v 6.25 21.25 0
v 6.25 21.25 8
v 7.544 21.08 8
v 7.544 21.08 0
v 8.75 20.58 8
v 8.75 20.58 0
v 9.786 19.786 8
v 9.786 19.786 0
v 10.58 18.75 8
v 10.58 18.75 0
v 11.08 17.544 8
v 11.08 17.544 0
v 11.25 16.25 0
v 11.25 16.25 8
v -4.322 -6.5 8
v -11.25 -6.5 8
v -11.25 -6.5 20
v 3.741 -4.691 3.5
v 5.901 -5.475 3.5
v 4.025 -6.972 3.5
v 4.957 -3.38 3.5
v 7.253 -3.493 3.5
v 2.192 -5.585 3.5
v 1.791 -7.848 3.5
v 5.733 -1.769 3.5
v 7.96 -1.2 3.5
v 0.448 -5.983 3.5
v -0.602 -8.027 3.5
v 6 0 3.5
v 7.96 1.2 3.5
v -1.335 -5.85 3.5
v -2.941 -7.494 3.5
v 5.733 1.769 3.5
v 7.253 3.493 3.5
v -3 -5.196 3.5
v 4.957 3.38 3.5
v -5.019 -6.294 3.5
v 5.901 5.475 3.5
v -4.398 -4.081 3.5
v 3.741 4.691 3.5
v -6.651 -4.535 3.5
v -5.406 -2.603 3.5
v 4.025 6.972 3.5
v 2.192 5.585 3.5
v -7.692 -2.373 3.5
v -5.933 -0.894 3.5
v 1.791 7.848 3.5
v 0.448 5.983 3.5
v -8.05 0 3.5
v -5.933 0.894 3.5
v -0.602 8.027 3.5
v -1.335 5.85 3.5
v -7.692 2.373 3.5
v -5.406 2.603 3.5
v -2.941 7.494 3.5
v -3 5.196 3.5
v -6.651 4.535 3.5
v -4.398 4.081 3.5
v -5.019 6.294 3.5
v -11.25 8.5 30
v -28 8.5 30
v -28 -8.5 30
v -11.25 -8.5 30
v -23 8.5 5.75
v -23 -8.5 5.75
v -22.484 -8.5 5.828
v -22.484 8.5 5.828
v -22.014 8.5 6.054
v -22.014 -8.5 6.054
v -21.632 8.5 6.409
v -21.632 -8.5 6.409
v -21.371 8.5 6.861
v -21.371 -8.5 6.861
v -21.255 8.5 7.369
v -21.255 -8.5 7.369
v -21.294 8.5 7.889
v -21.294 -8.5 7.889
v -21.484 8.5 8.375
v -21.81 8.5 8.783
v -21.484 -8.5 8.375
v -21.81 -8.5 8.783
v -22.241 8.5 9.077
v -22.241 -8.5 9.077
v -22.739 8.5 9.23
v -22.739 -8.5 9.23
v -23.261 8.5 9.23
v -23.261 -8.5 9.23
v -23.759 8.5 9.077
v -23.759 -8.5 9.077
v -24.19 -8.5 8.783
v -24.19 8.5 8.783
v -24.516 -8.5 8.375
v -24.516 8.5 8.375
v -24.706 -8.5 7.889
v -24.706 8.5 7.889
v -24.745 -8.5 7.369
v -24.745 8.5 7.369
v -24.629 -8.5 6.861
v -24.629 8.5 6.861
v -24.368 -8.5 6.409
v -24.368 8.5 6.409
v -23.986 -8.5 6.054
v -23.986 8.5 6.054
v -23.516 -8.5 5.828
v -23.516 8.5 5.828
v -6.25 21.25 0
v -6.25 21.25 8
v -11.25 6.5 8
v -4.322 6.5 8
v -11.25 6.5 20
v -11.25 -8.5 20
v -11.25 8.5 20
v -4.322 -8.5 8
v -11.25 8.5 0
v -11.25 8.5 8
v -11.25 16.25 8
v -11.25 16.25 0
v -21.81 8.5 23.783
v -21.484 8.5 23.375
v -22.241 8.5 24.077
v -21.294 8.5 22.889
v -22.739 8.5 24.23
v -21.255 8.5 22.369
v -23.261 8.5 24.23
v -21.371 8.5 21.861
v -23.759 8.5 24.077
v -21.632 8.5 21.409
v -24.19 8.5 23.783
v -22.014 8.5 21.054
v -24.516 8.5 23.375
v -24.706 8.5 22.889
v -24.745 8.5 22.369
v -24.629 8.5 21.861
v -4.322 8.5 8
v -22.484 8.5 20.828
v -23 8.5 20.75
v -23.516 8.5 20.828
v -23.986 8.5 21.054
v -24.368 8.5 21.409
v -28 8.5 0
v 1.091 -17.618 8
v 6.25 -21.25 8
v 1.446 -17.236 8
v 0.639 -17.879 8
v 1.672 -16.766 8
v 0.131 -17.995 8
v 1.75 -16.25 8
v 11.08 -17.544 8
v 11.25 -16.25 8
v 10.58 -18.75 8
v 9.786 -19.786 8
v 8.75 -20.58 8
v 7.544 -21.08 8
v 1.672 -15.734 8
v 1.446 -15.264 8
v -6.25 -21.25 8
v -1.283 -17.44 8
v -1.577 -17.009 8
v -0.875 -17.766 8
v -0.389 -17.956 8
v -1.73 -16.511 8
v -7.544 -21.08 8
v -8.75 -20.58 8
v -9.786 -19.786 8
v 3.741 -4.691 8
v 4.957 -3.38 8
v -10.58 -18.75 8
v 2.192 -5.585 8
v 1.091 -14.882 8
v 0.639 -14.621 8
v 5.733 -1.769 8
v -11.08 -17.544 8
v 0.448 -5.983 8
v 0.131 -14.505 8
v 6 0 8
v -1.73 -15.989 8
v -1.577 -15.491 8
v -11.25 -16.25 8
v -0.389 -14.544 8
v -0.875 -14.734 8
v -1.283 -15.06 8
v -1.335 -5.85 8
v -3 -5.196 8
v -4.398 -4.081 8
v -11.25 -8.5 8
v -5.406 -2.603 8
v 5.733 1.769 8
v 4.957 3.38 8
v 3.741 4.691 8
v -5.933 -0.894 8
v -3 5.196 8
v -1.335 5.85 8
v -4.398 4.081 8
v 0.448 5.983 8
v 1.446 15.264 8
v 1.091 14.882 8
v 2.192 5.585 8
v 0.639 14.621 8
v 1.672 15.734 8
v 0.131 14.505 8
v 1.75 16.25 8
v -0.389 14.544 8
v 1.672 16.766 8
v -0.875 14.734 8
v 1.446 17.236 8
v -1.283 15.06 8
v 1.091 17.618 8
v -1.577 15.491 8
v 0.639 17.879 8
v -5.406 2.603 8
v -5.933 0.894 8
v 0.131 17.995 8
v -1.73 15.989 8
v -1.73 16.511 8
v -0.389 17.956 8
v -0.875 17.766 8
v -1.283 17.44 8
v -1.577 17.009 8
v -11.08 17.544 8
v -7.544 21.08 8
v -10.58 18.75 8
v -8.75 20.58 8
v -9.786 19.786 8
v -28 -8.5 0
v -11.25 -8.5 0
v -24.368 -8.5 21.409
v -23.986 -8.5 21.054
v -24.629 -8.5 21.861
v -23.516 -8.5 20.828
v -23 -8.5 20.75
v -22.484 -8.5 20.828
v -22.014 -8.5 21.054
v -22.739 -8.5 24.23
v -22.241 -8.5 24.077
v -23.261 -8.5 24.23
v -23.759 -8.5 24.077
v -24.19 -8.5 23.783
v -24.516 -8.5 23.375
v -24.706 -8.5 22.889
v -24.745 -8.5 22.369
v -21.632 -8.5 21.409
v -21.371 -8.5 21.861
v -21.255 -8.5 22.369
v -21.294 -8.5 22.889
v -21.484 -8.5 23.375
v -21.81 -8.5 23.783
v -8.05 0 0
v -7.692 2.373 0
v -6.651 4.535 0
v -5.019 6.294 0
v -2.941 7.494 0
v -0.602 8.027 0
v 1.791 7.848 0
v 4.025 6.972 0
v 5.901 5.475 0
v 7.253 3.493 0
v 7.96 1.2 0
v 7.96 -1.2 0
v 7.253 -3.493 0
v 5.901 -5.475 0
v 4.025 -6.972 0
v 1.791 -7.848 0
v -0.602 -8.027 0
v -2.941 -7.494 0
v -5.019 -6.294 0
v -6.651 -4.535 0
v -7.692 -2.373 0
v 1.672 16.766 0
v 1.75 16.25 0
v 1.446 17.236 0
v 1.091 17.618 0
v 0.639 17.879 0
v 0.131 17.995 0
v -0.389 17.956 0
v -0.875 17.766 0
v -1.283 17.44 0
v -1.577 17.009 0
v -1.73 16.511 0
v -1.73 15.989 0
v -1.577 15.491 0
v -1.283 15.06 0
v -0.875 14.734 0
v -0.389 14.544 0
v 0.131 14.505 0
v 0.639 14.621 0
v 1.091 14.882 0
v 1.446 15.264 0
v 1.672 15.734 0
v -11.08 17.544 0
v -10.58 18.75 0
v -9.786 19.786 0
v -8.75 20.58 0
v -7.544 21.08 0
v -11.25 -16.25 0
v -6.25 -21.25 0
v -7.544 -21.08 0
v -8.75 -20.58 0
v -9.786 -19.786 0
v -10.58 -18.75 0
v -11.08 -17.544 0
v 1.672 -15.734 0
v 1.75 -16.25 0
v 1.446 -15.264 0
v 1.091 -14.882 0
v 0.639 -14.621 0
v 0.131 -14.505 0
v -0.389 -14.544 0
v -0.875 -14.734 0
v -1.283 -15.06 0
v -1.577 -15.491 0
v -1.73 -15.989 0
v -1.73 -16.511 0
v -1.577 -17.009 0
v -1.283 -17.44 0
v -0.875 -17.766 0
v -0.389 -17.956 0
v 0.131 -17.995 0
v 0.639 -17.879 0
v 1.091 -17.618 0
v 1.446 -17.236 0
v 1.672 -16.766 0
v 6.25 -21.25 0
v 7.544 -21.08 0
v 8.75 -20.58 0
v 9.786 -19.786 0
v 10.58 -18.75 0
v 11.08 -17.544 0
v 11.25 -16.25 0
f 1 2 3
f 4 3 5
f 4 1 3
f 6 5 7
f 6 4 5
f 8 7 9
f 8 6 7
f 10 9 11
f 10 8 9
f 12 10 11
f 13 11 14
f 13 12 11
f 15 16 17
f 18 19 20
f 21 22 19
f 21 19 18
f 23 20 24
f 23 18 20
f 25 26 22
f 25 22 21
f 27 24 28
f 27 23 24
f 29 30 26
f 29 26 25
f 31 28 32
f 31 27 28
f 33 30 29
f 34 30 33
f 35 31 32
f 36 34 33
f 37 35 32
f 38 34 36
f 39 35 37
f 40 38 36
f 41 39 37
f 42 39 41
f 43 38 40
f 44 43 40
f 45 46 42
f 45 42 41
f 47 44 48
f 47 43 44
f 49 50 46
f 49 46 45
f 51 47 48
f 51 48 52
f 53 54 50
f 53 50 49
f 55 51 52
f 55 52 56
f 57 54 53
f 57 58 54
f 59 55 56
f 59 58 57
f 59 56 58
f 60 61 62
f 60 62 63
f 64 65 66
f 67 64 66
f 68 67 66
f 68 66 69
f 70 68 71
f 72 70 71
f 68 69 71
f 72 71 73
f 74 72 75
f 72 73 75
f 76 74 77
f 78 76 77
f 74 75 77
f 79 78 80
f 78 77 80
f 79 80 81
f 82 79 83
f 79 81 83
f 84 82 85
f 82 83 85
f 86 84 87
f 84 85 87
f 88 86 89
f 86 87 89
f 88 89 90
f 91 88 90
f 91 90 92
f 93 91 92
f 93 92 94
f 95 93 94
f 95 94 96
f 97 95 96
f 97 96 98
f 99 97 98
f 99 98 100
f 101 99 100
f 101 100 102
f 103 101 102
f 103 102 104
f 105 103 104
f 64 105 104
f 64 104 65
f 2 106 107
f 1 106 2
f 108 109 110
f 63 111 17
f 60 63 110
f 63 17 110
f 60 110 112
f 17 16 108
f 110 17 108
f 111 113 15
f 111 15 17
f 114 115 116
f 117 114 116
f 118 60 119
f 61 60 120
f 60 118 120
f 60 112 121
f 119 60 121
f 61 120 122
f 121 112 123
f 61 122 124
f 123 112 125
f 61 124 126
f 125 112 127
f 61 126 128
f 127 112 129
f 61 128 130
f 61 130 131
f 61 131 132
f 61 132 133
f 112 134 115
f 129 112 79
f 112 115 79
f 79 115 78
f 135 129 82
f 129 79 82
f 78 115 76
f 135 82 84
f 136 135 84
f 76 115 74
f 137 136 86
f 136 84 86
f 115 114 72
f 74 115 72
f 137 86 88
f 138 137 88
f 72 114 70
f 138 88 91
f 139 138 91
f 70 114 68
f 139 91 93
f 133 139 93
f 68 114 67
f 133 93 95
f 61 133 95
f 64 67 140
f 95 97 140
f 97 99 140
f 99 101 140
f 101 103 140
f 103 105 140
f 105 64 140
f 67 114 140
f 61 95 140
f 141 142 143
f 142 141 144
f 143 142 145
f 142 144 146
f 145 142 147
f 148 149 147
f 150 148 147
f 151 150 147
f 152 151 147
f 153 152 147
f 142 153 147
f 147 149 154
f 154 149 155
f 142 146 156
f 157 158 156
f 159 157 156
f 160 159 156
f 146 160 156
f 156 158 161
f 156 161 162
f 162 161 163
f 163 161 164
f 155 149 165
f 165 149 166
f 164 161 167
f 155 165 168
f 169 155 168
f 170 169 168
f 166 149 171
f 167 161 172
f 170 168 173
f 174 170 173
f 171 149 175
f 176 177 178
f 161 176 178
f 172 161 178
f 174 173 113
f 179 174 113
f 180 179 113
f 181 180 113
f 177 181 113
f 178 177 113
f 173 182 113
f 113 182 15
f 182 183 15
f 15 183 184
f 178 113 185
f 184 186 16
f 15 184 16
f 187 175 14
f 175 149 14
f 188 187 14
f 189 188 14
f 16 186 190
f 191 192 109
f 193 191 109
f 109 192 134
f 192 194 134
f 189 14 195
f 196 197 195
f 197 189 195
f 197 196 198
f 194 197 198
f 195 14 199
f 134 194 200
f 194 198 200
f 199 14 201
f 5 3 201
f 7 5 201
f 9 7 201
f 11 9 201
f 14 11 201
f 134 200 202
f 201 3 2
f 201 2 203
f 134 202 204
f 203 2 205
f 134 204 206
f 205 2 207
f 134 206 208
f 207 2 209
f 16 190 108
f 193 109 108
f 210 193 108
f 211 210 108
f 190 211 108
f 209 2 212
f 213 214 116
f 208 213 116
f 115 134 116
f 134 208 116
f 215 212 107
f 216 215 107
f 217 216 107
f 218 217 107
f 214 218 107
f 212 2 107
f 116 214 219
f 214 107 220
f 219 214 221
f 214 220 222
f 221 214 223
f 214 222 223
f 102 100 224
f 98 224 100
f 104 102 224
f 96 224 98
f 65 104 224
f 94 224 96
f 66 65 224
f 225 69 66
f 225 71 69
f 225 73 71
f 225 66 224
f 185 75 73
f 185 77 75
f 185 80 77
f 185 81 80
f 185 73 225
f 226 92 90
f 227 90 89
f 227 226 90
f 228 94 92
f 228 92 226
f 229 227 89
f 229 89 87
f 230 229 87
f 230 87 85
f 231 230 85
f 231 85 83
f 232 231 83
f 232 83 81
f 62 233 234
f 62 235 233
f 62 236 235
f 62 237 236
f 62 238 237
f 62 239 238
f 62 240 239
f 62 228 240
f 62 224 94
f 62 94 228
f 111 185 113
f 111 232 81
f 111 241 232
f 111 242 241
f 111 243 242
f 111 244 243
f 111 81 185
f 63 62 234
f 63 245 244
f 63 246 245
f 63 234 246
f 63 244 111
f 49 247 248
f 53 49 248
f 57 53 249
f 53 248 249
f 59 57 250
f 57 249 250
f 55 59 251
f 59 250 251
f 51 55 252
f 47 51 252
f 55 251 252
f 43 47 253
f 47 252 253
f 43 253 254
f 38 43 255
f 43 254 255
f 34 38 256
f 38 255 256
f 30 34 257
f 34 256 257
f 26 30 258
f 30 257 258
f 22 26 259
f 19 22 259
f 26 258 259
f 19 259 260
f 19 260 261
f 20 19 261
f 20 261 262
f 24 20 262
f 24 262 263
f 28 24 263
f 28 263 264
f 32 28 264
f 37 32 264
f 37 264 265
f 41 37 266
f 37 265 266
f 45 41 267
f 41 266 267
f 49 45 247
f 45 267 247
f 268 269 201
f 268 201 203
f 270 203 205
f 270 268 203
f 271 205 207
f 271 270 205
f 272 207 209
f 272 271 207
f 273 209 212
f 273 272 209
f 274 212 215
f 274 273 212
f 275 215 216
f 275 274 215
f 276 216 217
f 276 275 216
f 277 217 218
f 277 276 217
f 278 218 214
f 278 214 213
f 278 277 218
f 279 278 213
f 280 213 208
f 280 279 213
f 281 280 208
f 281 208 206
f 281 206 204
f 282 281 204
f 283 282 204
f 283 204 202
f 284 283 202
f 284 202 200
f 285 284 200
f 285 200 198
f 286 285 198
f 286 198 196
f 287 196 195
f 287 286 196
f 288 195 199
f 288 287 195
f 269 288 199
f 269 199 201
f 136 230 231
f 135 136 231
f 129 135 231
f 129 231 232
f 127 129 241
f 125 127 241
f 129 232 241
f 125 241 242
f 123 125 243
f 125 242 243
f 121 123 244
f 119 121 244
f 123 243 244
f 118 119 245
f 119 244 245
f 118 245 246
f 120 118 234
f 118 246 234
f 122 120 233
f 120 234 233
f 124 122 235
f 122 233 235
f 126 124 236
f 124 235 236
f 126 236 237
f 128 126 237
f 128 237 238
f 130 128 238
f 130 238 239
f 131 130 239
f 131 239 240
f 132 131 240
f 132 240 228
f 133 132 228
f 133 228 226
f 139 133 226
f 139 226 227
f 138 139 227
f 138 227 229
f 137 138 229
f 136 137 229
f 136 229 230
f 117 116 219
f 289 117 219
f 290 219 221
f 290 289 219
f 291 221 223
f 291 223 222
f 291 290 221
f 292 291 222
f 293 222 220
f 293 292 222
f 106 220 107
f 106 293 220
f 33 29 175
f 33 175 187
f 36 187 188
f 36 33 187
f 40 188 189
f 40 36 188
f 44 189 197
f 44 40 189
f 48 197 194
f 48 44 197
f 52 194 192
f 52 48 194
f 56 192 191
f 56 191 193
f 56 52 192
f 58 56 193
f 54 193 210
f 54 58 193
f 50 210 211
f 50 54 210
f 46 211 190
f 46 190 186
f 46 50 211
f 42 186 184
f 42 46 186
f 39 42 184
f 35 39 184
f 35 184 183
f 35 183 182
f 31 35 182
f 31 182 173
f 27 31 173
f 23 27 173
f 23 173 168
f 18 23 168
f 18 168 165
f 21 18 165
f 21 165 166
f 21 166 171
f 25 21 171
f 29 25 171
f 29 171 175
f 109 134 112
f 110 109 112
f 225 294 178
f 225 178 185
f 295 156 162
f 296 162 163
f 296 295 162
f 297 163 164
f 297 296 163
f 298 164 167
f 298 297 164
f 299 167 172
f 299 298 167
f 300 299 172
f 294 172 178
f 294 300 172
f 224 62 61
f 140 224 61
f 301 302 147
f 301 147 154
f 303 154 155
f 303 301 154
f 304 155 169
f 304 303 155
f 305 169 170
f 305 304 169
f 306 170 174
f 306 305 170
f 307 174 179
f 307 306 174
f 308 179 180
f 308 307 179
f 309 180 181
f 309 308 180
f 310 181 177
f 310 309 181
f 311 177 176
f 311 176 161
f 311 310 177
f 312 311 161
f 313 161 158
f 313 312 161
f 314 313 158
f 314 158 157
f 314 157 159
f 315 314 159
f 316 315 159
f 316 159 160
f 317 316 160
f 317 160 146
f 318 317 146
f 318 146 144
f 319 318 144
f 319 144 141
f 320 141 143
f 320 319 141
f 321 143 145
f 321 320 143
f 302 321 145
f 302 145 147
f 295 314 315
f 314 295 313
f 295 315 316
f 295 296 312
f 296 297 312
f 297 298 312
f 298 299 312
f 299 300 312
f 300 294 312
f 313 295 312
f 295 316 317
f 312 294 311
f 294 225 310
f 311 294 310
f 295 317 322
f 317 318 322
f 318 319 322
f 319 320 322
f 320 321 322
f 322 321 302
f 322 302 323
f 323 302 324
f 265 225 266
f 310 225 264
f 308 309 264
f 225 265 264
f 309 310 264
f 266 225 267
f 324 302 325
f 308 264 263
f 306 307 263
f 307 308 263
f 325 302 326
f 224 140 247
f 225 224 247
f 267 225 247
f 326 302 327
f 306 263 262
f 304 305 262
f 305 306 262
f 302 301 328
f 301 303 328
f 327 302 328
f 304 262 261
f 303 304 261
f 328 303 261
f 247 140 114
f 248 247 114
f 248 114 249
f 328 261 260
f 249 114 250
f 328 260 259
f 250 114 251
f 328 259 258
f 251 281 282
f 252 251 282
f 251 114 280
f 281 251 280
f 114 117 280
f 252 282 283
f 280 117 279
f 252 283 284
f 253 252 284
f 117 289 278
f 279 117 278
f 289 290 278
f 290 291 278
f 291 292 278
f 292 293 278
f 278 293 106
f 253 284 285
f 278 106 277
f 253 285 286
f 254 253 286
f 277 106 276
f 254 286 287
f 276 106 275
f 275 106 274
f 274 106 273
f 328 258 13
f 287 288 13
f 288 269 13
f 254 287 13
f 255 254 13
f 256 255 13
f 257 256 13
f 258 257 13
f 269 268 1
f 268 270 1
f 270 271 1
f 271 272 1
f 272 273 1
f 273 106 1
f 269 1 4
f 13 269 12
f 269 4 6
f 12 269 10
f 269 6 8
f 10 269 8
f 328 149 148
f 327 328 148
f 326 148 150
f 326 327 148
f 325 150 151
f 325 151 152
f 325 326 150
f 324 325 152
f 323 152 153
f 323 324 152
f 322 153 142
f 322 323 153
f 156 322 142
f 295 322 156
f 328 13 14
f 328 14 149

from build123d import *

# Parameters (mm, degrees)
SKETCH_2_R          = 1.75
SKETCH_2_R_2        = 6
EXTRUDE_1_DEPTH     = 8
SKETCH_3_R          = 8.05
CUT_EXTRUDE_1_DEPTH = 3.5
SKETCH_4_W          = 16.75
SKETCH_4_H          = 17
EXTRUDE_2_DEPTH     = 30
SKETCH_5_R          = 1.75
CUT_EXTRUDE_2_DEPTH = 51.685920136
EXTRUDE_3_DEPTH     = 2
EXTRUDE_4_DEPTH     = 2


with BuildPart() as part:
    # 草图2 → 凸台-拉伸1 (new body)
    with BuildSketch(Plane.XY):
        with BuildLine():
            Line((-6.25, 21.25), (6.25, 21.25))
            ThreePointArc((6.25, 21.25), (9.785533906, 19.785533906), (11.25, 16.25))
            Line((11.25, 16.25), (11.25, -16.25))
            ThreePointArc((11.25, -16.25), (9.785533906, -19.785533906), (6.25, -21.25))
            Line((6.25, -21.25), (-6.25, -21.25))
            ThreePointArc((-6.25, -21.25), (-9.785533906, -19.785533906), (-11.25, -16.25))
            Line((-11.25, -16.25), (-11.25, 16.25))
            ThreePointArc((-11.25, 16.25), (-9.785533906, 19.785533906), (-6.25, 21.25))
        make_face()
        with Locations((0, -16.25)):
            Circle(SKETCH_2_R, mode=Mode.SUBTRACT)
        Circle(SKETCH_2_R_2, mode=Mode.SUBTRACT)
        with Locations((0, 16.25)):
            Circle(SKETCH_2_R, mode=Mode.SUBTRACT)
    extrude(amount=EXTRUDE_1_DEPTH)

    # 草图3 → 切除-拉伸1 (cut)
    with BuildSketch(Plane(origin=(0, 0, 0), x_dir=(-1, 0, 0), z_dir=(0, 0, -1))):
        Circle(SKETCH_3_R)
    extrude(amount=-CUT_EXTRUDE_1_DEPTH, mode=Mode.SUBTRACT)

    # 草图4 → 凸台-拉伸2 (add)
    with BuildSketch(Plane.XY):
        with Locations((-19.625, 0)):
            Rectangle(SKETCH_4_W, SKETCH_4_H)
    extrude(amount=EXTRUDE_2_DEPTH)

    # 草图5 → 切除-拉伸2 (cut, through all)
    with BuildSketch(Plane.XZ.offset(8.5)):
        with Locations(Location((-23, 22.5, 0), (0, 0, 270))):
            Circle(SKETCH_5_R)
        with Locations(Location((-23, 7.5, 0), (0, 0, 270))):
            Circle(SKETCH_5_R)
    extrude(amount=-CUT_EXTRUDE_2_DEPTH, mode=Mode.SUBTRACT)

    # 草图7 → 凸台-拉伸3 (add)
    with BuildSketch(Plane.XZ.offset(8.5)):
        Polygon((-11.25, 20), (-11.25, 8), (-4.32179677, 8), align=None)
    extrude(amount=-EXTRUDE_3_DEPTH)

    # 草图8 → 凸台-拉伸4 (add)
    with BuildSketch(Plane(origin=(0, 8.5, 0), x_dir=(1, 0, 0), z_dir=(0, 1, 0))):
        Polygon((-4.32179677, -8), (-11.25, -20), (-11.25, -8), align=None)
    extrude(amount=-EXTRUDE_4_DEPTH)


solid = part.part
